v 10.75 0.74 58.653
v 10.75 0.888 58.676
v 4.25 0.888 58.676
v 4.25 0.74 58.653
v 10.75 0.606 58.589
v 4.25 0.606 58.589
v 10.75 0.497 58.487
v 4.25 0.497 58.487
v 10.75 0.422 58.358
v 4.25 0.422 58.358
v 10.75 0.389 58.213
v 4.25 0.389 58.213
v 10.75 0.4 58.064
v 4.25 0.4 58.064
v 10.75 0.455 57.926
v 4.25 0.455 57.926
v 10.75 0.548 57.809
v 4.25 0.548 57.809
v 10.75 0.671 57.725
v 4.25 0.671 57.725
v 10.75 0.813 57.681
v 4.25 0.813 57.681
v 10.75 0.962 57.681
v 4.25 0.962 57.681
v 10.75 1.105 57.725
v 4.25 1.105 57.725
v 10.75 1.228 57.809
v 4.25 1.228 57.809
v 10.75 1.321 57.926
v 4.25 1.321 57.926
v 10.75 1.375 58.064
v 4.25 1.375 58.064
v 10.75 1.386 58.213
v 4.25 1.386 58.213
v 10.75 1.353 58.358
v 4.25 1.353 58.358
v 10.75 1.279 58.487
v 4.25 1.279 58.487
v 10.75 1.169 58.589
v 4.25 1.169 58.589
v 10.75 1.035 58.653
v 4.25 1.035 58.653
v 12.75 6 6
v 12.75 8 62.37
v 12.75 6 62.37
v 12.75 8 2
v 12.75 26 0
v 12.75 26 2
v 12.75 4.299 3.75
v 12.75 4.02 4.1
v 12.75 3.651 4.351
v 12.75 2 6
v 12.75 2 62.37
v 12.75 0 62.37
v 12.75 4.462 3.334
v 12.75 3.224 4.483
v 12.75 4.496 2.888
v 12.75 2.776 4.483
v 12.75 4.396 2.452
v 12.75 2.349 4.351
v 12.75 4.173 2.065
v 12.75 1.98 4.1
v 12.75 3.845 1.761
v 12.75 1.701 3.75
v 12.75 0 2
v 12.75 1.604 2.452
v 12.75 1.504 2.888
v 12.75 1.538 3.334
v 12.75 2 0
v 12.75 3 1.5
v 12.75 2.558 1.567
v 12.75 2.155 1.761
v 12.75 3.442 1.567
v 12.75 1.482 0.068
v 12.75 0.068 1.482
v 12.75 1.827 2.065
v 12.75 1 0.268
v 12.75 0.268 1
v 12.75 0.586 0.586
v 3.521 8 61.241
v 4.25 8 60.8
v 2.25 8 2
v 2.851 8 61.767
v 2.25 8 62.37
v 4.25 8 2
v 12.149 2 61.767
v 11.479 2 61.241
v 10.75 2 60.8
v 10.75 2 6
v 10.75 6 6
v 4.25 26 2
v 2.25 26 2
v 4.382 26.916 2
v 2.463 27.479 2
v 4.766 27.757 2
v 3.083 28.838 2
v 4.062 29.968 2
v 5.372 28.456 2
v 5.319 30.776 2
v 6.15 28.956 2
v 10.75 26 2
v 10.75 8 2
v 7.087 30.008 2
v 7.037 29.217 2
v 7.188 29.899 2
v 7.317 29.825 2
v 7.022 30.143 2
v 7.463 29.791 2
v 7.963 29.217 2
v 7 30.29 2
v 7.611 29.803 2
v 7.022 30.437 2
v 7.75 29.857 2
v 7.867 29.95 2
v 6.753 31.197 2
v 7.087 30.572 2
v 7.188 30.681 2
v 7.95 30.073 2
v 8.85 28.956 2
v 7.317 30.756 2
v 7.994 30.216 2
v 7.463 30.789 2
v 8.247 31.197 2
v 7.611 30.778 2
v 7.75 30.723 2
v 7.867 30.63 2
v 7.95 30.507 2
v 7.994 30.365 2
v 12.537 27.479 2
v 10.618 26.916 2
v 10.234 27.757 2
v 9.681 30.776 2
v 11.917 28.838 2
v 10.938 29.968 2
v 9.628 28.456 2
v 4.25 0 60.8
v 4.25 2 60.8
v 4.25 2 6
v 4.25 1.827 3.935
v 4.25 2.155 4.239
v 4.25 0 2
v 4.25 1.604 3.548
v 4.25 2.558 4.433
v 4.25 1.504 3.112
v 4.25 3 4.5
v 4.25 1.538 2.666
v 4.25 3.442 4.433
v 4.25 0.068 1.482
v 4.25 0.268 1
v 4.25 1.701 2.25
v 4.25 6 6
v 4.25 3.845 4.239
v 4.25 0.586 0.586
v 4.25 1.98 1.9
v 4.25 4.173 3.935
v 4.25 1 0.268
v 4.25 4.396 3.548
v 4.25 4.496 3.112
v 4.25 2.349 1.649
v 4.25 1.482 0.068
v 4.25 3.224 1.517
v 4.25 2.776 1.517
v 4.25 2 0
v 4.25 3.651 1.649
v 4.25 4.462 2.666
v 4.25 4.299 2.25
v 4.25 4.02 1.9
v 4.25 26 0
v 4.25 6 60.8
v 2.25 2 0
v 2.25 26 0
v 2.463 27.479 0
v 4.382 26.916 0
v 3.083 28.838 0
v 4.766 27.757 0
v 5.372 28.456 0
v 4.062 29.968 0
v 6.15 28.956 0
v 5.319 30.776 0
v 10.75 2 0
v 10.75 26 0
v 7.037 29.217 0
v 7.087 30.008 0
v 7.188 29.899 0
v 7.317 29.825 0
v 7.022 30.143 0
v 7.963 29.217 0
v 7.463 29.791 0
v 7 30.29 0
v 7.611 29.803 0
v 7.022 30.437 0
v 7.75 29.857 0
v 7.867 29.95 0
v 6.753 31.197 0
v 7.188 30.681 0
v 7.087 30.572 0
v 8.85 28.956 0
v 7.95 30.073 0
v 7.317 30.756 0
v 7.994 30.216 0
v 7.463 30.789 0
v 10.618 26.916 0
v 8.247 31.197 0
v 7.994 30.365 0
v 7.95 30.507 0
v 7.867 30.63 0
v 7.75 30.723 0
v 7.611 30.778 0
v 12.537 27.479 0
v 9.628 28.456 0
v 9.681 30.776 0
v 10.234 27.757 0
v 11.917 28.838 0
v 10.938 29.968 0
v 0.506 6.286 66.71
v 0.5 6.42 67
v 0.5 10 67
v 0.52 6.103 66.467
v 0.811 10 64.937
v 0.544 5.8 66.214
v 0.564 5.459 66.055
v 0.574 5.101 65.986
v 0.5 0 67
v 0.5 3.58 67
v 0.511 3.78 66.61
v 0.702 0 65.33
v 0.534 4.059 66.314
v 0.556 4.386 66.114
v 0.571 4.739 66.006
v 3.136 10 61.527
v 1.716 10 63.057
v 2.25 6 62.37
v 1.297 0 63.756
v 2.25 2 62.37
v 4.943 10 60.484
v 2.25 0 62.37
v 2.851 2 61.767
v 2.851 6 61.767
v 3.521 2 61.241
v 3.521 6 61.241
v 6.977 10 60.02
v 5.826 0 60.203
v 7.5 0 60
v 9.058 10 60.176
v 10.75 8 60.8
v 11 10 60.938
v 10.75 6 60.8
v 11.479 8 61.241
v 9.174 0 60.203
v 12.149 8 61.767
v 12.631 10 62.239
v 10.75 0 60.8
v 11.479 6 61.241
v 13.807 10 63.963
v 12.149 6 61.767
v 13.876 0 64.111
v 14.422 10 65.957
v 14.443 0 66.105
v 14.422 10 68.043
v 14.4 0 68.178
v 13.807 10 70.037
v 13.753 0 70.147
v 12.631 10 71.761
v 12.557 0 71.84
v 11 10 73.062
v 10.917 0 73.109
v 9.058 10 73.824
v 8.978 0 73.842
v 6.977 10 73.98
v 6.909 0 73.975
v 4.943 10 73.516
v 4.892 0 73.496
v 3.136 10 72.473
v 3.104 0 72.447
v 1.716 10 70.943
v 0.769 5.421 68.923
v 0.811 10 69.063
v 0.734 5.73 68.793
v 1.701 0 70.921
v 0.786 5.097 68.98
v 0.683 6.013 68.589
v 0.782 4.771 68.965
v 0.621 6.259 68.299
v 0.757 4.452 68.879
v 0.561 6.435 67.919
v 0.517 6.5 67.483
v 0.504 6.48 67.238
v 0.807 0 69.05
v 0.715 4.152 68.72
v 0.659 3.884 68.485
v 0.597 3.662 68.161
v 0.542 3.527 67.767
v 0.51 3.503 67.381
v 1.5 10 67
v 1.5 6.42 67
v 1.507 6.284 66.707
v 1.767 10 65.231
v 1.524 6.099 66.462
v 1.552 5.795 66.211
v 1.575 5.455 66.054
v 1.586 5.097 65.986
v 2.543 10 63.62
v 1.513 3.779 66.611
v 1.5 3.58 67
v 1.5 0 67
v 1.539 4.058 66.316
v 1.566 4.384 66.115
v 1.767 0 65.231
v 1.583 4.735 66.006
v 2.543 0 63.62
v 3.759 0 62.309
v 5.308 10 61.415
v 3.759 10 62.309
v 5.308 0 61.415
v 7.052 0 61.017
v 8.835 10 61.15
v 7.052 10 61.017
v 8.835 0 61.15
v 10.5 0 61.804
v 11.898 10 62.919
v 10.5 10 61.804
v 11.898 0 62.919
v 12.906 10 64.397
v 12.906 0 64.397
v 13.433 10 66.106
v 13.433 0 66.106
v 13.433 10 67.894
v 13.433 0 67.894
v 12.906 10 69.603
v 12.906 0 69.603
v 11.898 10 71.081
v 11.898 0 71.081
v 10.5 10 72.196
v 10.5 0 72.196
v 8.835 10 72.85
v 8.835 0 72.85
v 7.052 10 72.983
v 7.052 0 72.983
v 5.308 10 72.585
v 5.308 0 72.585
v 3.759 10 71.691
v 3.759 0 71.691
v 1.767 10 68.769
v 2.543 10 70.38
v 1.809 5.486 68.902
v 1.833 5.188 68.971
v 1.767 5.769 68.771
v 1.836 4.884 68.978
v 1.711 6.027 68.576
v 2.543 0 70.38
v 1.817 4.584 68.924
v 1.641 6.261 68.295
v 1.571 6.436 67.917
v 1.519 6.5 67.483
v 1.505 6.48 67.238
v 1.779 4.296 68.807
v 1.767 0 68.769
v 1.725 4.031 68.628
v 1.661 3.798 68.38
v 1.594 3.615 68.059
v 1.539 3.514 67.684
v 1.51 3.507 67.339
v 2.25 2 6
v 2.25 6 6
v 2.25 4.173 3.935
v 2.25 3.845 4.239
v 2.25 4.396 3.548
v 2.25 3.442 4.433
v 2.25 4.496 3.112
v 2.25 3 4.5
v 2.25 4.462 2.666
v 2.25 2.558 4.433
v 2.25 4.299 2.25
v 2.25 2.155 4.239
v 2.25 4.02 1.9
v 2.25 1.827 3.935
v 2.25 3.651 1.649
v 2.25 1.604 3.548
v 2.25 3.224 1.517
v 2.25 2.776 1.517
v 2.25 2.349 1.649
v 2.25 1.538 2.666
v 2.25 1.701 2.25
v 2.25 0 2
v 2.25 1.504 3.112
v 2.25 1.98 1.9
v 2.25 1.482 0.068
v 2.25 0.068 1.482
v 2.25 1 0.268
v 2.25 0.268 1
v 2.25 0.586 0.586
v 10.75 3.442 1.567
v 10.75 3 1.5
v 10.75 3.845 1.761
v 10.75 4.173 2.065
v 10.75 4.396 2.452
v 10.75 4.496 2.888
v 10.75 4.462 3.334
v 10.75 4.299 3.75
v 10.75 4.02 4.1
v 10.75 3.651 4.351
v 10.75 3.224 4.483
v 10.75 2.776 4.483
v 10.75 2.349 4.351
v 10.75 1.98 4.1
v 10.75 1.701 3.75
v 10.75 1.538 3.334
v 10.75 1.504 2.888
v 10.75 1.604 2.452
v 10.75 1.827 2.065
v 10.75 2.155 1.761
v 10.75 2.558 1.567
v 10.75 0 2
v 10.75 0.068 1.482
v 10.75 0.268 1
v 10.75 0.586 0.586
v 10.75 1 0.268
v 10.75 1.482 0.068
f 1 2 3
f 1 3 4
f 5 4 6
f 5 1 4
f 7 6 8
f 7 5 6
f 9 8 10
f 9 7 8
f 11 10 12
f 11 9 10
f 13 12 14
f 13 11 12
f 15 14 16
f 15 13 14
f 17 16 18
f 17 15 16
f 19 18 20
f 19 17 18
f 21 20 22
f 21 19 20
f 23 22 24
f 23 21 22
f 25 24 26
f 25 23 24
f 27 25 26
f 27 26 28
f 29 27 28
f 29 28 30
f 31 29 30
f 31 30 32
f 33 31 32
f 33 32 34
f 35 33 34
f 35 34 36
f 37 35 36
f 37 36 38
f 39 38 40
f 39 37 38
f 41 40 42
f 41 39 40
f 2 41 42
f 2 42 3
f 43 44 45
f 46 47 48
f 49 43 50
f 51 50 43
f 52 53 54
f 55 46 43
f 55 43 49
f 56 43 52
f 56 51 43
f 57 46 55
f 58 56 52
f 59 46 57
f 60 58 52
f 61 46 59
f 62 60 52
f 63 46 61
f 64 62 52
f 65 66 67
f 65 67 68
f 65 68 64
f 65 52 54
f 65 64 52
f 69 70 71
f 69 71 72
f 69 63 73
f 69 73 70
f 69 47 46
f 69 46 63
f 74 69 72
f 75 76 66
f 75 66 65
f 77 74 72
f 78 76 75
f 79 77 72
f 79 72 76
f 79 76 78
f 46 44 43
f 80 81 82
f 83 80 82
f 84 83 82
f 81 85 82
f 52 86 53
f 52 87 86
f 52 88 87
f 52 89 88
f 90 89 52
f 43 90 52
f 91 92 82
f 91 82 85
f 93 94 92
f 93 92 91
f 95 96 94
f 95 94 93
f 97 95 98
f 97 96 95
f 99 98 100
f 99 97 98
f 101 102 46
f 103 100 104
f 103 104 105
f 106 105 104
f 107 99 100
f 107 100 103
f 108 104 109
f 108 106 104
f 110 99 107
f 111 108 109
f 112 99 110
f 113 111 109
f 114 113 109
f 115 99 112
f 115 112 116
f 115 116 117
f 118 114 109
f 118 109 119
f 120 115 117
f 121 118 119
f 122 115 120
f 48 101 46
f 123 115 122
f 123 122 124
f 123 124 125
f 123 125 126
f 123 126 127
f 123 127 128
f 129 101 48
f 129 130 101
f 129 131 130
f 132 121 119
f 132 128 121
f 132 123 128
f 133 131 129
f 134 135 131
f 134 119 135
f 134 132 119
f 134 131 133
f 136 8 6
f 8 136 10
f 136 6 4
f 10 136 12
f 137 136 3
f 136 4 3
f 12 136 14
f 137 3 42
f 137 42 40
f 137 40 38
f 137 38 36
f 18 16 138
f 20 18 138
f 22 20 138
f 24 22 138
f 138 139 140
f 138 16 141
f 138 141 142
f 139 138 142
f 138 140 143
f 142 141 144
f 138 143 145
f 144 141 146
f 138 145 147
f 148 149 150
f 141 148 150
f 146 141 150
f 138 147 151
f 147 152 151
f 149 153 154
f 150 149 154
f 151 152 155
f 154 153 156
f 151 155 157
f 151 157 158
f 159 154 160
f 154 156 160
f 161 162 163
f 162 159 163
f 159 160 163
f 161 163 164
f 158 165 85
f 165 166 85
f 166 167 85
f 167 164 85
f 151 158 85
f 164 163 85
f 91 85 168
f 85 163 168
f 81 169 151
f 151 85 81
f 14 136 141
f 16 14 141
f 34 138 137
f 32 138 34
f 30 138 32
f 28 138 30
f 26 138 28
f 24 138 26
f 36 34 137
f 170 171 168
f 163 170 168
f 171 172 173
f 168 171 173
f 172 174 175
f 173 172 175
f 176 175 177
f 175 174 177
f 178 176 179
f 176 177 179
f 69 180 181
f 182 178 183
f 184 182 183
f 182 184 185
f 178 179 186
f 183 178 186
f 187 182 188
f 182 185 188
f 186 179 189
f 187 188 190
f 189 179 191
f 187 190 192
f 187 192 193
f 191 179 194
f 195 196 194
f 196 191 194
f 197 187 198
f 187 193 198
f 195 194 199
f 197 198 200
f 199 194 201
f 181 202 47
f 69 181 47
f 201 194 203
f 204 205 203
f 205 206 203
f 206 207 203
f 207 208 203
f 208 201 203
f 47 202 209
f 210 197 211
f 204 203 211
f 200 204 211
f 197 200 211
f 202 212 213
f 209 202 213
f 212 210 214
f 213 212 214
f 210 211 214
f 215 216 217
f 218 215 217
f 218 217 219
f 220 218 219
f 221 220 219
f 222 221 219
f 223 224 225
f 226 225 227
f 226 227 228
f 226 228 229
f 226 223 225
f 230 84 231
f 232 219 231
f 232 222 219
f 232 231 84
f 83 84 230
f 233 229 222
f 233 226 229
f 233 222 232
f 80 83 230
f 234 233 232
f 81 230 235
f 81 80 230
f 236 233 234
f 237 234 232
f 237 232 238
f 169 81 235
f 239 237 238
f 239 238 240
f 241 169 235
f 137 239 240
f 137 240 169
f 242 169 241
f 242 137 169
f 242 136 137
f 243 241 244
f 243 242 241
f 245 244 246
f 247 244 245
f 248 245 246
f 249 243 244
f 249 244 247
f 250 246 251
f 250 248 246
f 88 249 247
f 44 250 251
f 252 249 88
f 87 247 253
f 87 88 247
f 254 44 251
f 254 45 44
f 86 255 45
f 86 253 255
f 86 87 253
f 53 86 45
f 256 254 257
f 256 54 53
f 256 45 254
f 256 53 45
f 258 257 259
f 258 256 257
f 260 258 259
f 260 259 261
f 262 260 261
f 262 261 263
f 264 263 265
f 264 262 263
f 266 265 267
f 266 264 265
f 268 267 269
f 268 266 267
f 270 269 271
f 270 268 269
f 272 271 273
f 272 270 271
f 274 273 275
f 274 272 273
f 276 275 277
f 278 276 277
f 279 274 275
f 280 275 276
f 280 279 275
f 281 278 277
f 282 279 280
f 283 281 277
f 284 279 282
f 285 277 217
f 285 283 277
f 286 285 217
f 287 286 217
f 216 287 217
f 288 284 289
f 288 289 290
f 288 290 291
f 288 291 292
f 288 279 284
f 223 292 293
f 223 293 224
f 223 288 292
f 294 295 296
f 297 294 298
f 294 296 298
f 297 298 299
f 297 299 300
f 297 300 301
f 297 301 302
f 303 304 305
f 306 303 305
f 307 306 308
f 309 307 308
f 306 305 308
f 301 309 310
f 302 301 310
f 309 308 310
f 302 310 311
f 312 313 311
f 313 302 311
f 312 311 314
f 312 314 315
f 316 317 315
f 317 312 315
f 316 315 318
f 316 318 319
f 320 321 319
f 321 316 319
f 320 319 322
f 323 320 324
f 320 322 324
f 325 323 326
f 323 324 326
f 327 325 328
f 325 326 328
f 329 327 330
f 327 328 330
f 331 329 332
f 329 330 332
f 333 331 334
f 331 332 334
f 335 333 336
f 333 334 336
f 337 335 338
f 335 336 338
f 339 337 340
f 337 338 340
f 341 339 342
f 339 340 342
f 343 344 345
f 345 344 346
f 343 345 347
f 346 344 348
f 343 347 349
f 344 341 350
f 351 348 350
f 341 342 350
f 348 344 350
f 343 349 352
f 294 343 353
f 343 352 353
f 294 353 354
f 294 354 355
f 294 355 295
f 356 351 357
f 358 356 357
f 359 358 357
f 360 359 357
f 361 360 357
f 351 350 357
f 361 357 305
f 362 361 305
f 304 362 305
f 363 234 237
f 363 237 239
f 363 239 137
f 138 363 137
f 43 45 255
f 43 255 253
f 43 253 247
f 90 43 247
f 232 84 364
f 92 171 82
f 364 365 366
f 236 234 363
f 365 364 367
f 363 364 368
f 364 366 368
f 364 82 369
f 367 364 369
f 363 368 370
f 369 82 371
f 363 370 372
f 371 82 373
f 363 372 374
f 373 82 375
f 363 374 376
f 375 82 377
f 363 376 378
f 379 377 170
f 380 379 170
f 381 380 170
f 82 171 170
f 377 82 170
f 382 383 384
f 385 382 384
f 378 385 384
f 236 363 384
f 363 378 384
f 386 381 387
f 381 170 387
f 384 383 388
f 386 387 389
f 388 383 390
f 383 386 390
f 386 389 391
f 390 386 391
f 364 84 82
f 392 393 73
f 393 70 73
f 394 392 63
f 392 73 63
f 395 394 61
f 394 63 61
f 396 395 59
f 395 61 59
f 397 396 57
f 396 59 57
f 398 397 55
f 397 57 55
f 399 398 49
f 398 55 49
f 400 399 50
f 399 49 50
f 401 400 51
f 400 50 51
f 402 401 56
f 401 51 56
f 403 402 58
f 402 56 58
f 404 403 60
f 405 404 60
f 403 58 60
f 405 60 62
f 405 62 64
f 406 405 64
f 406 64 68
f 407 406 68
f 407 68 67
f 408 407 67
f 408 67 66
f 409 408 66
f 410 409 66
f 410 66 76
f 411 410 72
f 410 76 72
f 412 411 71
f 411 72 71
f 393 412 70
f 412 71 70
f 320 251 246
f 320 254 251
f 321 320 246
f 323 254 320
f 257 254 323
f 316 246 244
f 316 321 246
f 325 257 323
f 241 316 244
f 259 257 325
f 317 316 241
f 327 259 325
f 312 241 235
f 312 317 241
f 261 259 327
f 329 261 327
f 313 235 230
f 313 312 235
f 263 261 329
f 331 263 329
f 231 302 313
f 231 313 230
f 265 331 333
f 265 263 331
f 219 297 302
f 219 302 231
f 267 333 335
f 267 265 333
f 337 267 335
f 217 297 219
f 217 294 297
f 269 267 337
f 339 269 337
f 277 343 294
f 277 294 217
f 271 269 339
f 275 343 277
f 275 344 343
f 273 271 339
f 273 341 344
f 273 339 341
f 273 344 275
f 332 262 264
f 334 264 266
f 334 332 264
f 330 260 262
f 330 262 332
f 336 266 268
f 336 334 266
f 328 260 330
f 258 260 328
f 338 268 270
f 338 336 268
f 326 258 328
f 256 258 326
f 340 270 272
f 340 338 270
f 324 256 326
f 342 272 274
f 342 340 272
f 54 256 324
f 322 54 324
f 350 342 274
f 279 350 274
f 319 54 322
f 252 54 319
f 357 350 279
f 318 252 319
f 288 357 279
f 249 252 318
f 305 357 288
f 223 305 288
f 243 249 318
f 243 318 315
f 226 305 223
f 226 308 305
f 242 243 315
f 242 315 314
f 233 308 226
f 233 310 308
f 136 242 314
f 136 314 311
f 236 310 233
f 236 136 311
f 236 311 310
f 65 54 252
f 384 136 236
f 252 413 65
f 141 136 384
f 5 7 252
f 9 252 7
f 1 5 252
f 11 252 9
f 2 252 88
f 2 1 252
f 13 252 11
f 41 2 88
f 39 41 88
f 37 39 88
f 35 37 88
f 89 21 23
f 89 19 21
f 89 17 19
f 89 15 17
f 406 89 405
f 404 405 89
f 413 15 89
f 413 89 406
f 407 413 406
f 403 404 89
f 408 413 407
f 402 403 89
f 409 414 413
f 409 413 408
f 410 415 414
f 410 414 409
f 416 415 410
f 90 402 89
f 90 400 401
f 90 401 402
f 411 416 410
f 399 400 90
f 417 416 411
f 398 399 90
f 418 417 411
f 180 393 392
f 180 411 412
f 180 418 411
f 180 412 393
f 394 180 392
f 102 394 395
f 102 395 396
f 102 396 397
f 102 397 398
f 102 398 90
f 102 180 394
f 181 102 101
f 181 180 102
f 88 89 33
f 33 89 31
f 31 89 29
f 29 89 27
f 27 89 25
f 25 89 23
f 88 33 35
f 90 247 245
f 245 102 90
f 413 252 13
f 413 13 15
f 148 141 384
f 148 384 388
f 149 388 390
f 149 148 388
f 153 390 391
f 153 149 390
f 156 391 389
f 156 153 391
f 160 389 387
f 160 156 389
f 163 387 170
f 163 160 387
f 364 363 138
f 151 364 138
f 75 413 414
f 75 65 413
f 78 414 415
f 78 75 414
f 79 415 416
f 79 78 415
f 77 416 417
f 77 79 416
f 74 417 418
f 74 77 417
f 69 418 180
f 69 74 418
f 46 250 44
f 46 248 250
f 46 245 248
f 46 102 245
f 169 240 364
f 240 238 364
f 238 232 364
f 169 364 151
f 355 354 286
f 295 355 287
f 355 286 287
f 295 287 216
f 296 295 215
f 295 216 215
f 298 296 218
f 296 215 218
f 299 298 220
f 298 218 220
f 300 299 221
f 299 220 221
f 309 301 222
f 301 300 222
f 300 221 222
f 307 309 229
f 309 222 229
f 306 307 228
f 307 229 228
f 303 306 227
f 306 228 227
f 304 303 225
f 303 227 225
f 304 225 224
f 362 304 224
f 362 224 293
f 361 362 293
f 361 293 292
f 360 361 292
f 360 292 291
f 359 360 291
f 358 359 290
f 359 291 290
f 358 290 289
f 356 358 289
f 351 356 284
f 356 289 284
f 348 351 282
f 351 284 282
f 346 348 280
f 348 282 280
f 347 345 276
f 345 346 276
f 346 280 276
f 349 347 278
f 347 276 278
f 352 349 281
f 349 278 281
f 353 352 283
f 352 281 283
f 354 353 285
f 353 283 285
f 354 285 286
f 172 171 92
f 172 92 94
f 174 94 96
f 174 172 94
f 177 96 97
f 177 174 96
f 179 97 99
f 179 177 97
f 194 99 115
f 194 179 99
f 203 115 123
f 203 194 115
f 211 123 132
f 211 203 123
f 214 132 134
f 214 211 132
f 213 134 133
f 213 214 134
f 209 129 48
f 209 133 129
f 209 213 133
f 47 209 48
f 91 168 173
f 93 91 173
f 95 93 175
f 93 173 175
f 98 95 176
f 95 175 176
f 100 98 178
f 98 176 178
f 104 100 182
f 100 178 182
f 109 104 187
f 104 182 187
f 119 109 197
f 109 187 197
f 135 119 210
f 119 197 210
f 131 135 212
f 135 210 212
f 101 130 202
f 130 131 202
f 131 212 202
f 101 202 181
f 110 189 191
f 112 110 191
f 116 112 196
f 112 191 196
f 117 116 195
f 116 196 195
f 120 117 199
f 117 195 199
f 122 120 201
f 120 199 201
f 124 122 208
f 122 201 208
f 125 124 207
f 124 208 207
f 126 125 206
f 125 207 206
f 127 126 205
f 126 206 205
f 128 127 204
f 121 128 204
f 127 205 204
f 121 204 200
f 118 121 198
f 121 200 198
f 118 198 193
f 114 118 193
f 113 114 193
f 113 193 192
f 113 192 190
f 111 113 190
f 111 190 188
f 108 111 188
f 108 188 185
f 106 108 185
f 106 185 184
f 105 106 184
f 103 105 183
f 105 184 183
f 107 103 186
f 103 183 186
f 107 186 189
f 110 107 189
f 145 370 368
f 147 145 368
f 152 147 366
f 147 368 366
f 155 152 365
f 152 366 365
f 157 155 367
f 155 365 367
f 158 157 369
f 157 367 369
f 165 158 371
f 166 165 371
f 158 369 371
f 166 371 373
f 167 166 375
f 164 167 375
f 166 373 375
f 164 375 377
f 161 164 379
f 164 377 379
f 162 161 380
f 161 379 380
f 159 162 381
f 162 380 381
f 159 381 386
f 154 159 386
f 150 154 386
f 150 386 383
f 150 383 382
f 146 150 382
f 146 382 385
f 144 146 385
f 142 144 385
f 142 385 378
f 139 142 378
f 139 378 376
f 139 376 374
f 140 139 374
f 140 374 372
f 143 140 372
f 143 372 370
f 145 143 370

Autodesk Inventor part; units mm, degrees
ref_plane "XZ Plane" through (0, 0, 0) normal (0, 1, 0) x (-1, 0, 0)
sketch "Sketch1" plane through (0, 0, 0) normal (0, 0, 1) x (1, 0, 0)
  line L0 (0, 0) -> (15, 0)
  line L1 (0, 0) -> (2.25, 0)
  line L2 (2.25, 0) -> (2.25, 4.6954)
  line L3 (2.25, 0) -> (4.25, 0)
  line L4 (4.25, 0) -> (4.25, 4.6954)
  line L5 (0, 0) -> (4.5, 0)
  line L6 (0, 0) -> (1.7131, 0)
  line L7 (0, 0) -> (2, 0)
  line L8 (2, 0) -> (2, -1.4268)
  line L9 (4.5, 0) -> (4.5, -1.5938)
  line L10 (0, 0) -> (10.5, 0)
  line L11 (10.5, 0) -> (10.5, -1.4268)
  line L12 (0, 0) -> (10.75, 0)
  line L13 (10.75, 0) -> (10.75, 3.2646)
  line L14 (10.75, 0) -> (12.75, 0)
  line L15 (12.75, 0) -> (12.75, 3.2646)
  line L16 (0, 0) -> (13, 0)
  line L17 (13, 0) -> (13, -1.4268)
  line L18 (12.75, 0) -> (12.75, 2)
  line L19 (12.75, 2) -> (10.75, 2)
  line L20 (10.75, 0) -> (12.75, 0)
  line L21 (4.25, 0) -> (4.25, 2)
  line L22 (4.25, 2) -> (2.25, 2)
  dimension "d0" = 15
  dimension "d1" = 2.25
  dimension "d2" = 2
  dimension "d3" = 4.5
  dimension "d4" = 2
  dimension "d5" = 10.5
  dimension "d6" = 10.75
  dimension "d7" = 2
  dimension "d8" = 13
  dimension "d9" = 2
  dimension "d10" = 2
extrude "Extrusion1" add sketch "Sketch1" along normal blind 60
sketch "Sketch2" plane through (2.25, 2, 0) normal (0, 1, 0) x (1, 0, 0)
  line L0 (2, 0) -> (0, 0)
  line L1 (0, 0) -> (0, -6)
  line L2 (0, -6) -> (2, -6)
  line L3 (2, -6) -> (2, 0)
  point P0 (-2.25, 0)
  dimension "d13" = 2
  dimension "d14" = 6
extrude "Extrusion2" add sketch "Sketch2" along normal blind 4
sketch "Sketch3" plane through (2.25, 0, 60) normal (-1, 0, 0) x (0, 0, 1)
  line L0 (-60, 0) -> (-60, 6)
  line L1 (-60, 0) -> (-60, 6) projected
  line L2 (-60, 6) -> (-54, 6)
  line L3 (-54, 2) -> (-54, 6) projected
  circle A0 centre (-57, 3) radius 1.5
  dimension "d17" = 6
  dimension "d18" = 3
extrude "Extrusion3" cut sketch "Sketch3" against normal blind 6
sketch "Sketch4" plane through (2.25, 6, 0) normal (0, 1, 0) x (1, 0, 0)
  line L0 (0, 0) -> (2, 0)
  line L1 (2, 0) -> (2, -2)
  line L2 (2, -2) -> (0, -2)
  line L3 (0, -2) -> (0, 0)
  point P0 (-2.25, 0)
  dimension "d22" = 2
  dimension "d23" = 2
extrude "Extrusion4" add sketch "Sketch4" along normal blind 20
sketch "Sketch5" plane through (10.75, 2, 0) normal (0, 1, 0) x (1, 0, 0)
  line L0 (0, 0) -> (0, -60) projected
  line L1 (2, 0) -> (0, 0)
  line L2 (0, 0) -> (0, -6)
  line L3 (0, -6) -> (2, -6)
  line L4 (2, -6) -> (2, 0)
  point P0 (-10.75, 0)
  dimension "d27" = 6
extrude "Extrusion5" add sketch "Sketch5" along normal blind 4
sketch "Sketch6" plane through (12.75, 0, 60) normal (1, 0, 0) x (0, 0, -1)
  line L0 (54, 6) -> (60, 0)
  circle A0 centre (57, 3) radius 1.5
  circle A1 centre (57, 3) radius 1.5
extrude "Extrusion6" cut sketch "Sketch6" against normal blind 4
sketch "Sketch7" plane through (10.75, 6, 0) normal (0, 1, 0) x (1, 0, 0)
  line L0 (0, 0) -> (2, 0)
  line L1 (2, 0) -> (2, -2)
  line L2 (2, -2) -> (0, -2)
  line L3 (0, -2) -> (0, 0)
  point P0 (-10.75, 0)
extrude "Extrusion7" add sketch "Sketch7" along normal blind 20
ref_plane "Work Plane1" through (0, 0, 0) normal (0, 0, 1) x (1, 0, 0)
sketch "Sketch8" plane through (0, 0, 0) normal (0, 0, 1) x (1, 0, 0)
  arc A0 (12.75, 26) -> (2.25, 26) centre (7.5, 26) ccw
  arc A1 (10.75, 26) -> (4.25, 26) centre (7.5, 26) ccw
  line L0 (12.75, 0) -> (12.75, 26) projected
  line L1 (12.75, 26) -> (10.75, 26)
  line L2 (4.25, 26) -> (2.25, 26)
  line L3 (4.25, 26) -> (2.25, 26)
  line L4 (12.75, 26) -> (10.75, 26)
  line L5 (4.25, 26) -> (2.25, 26)
  arc A2 (10.75, 26) -> (4.25, 26) centre (7.5, 26) ccw
  arc A3 (12.75, 26) -> (2.25, 26) centre (7.5, 26) ccw
  point P0 (0, 0)
  point P1 (12.75, 2)
extrude "Extrusion8" add sketch "Sketch8" along normal blind 2
ref_plane "Work Plane2" through (0, 0, 60) normal (0, 0, 1) x (1, 0, 0)
sketch "Sketch9" plane through (0, 0, 0) normal (0, 1, 0) x (-1, 0, 0)
  line L0 (-2.25, 60) -> (-12.75, 60)
  line L1 (-7.5, 60) -> (-0.5, 60) construction
  circle A0 centre (-7.5, 67) radius 6
  circle A1 centre (-7.5, 67) radius 7
  point P0 (0, 0)
extrude "Extrusion9" add sketch "Sketch9" along normal blind 10
sketch "Sketch10" plane through (0, 0, 60) normal (0, 0, 1) x (1, 0, 0)
  line L0 (2.25, 0) -> (4.25, 0)
  line L1 (4.25, 0) -> (4.25, 2)
  line L2 (4.25, 2) -> (2.25, 2)
  line L3 (2.25, 2) -> (2.25, 0)
  point P0 (0, 0)
extrude "Extrusion10" add sketch "Sketch10" along normal blind 1.5
sketch "Sketch11" plane through (0, 0, 61.5) normal (0, 0, 1) x (1, 0, 0)
  line L0 (2.25, 2) -> (3.1699, 2)
  line L1 (3.1699, 2) -> (3.1699, 0)
  line L2 (3.1699, 0) -> (2.25, 0)
  line L3 (2.25, 0) -> (3.1699, 0) projected
  line L4 (2.25, 0) -> (2.25, 2)
  point P0 (0, 0)
extrude "Extrusion11" add sketch "Sketch11" along normal blind 1
sketch "Sketch12" plane through (0, 0, 60) normal (0, 0, 1) x (1, 0, 0)
  line L0 (12.75, 0) -> (10.75, 0)
  line L1 (10.75, 0) -> (10.75, 2)
  line L2 (10.75, 2) -> (12.75, 2)
  line L3 (12.75, 2) -> (12.75, 0)
  point P0 (0, 0)
extrude "Extrusion12" add sketch "Sketch12" along normal blind 1.5
sketch "Sketch13" plane through (0, 0, 61.5) normal (0, 0, 1) x (1, 0, 0)
  line L0 (12.75, 0) -> (11.8301, 0)
  line L1 (11.8301, 0) -> (11.8301, 2)
  line L2 (11.8301, 2) -> (12.75, 2)
  line L3 (12.75, 2) -> (12.75, 0)
  point P0 (0, 0)
extrude "Extrusion13" add sketch "Sketch13" along normal blind 1
sketch "Sketch14" plane through (2.25, 6, 2) normal (0, 0, 1) x (1, 0, 0)
  line L0 (0, 0) -> (2, 0)
  line L1 (2, 0) -> (2, 2)
  line L2 (2, 2) -> (0, 2)
  line L3 (0, 2) -> (0, 0)
  line L4 (8.5, 0) -> (10.5, 0)
  line L5 (10.5, 0) -> (10.5, 2)
  line L6 (10.5, 2) -> (8.5, 2)
  line L7 (8.5, 2) -> (8.5, 0)
  point P0 (-2.25, -6)
  dimension "d52" = 2
  dimension "d53" = 2
  dimension "d54" = 2
  dimension "d55" = 2
extrude "Extrusion14" add sketch "Sketch14" along normal blind 59.5
sketch "Sketch15" plane through (2.25, 6, 61.5) normal (0, 0, 1) x (1, 0, 0)
  line L0 (10.5, 0) -> (9.5801, 0)
  line L1 (9.5801, 0) -> (9.5801, 2)
  line L2 (9.5801, 2) -> (10.5, 2)
  line L3 (10.5, 2) -> (10.5, 0)
  point P0 (-2.25, -6)
extrude "Extrusion15" add sketch "Sketch15" along normal blind 1
sketch "Sketch16" plane through (2.25, 6, 61.5) normal (0, 0, 1) x (1, 0, 0)
  line L0 (0, 0) -> (0.9199, 0)
  line L1 (0.9199, 0) -> (0.9199, 2)
  line L2 (0.9199, 2) -> (0, 2)
  line L3 (0, 2) -> (0, 0)
  point P0 (-2.25, -6)
extrude "Extrusion16" add sketch "Sketch16" along normal blind 1
fillet "Fillet4" radius 2 2 edges at (3.25, 0, 0) (11.75, 0, 0)
sketch "Sketch17" plane through (0, 0, 0) normal (0, 0, -1) x (-1, 0, 0)
  line L0 (-2.25, 26) -> (-12.75, 26)
  line L1 (-7.5, 26) -> (-7.5, 31.25)
  arc A0 (-2.25, 26) -> (-12.75, 26) centre (-7.5, 26) ccw projected
  circle A1 centre (-7.5, 30.2901) radius 0.5
  point P0 (0, 0)
  dimension "d63" = 1
extrude "Extrusion17" cut sketch "Sketch17" against normal blind 2 contours A1 L1 | L1 A1
sketch "Sketch18" plane through (10.75, 2, 6) normal (-1, 0, 0) x (0, 0, 1)
  circle A0 centre (52.1755, -1.1123) radius 0.5
  point P0 (-6, -2)
  dimension "d66" = 1
extrude "Extrusion18" add sketch "Sketch18" along normal blind 8
ref_plane "Work Plane3" through (0.5, 0, 0) normal (1, 0, 0) x (0, 1, 0)
sketch "Sketch19" plane through (0.5, 0, 0) normal (1, 0, 0) x (0, 1, 0)
  point P0 (0, 0)
sketch "Sketch20" plane through (0.5, 0, 0) normal (1, 0, 0) x (0, 1, 0)
  line L0 (0, 74) -> (0, 62.3699) projected
  line L1 (10, 73) -> (10, 61) projected
  circle A0 centre (5, 67.4828) radius 1.5
  point P0 (0, 0)
  dimension "d70" = 3
extrude "Extrusion19" cut sketch "Sketch20" along normal mid plane 10
properties part number "arm"
